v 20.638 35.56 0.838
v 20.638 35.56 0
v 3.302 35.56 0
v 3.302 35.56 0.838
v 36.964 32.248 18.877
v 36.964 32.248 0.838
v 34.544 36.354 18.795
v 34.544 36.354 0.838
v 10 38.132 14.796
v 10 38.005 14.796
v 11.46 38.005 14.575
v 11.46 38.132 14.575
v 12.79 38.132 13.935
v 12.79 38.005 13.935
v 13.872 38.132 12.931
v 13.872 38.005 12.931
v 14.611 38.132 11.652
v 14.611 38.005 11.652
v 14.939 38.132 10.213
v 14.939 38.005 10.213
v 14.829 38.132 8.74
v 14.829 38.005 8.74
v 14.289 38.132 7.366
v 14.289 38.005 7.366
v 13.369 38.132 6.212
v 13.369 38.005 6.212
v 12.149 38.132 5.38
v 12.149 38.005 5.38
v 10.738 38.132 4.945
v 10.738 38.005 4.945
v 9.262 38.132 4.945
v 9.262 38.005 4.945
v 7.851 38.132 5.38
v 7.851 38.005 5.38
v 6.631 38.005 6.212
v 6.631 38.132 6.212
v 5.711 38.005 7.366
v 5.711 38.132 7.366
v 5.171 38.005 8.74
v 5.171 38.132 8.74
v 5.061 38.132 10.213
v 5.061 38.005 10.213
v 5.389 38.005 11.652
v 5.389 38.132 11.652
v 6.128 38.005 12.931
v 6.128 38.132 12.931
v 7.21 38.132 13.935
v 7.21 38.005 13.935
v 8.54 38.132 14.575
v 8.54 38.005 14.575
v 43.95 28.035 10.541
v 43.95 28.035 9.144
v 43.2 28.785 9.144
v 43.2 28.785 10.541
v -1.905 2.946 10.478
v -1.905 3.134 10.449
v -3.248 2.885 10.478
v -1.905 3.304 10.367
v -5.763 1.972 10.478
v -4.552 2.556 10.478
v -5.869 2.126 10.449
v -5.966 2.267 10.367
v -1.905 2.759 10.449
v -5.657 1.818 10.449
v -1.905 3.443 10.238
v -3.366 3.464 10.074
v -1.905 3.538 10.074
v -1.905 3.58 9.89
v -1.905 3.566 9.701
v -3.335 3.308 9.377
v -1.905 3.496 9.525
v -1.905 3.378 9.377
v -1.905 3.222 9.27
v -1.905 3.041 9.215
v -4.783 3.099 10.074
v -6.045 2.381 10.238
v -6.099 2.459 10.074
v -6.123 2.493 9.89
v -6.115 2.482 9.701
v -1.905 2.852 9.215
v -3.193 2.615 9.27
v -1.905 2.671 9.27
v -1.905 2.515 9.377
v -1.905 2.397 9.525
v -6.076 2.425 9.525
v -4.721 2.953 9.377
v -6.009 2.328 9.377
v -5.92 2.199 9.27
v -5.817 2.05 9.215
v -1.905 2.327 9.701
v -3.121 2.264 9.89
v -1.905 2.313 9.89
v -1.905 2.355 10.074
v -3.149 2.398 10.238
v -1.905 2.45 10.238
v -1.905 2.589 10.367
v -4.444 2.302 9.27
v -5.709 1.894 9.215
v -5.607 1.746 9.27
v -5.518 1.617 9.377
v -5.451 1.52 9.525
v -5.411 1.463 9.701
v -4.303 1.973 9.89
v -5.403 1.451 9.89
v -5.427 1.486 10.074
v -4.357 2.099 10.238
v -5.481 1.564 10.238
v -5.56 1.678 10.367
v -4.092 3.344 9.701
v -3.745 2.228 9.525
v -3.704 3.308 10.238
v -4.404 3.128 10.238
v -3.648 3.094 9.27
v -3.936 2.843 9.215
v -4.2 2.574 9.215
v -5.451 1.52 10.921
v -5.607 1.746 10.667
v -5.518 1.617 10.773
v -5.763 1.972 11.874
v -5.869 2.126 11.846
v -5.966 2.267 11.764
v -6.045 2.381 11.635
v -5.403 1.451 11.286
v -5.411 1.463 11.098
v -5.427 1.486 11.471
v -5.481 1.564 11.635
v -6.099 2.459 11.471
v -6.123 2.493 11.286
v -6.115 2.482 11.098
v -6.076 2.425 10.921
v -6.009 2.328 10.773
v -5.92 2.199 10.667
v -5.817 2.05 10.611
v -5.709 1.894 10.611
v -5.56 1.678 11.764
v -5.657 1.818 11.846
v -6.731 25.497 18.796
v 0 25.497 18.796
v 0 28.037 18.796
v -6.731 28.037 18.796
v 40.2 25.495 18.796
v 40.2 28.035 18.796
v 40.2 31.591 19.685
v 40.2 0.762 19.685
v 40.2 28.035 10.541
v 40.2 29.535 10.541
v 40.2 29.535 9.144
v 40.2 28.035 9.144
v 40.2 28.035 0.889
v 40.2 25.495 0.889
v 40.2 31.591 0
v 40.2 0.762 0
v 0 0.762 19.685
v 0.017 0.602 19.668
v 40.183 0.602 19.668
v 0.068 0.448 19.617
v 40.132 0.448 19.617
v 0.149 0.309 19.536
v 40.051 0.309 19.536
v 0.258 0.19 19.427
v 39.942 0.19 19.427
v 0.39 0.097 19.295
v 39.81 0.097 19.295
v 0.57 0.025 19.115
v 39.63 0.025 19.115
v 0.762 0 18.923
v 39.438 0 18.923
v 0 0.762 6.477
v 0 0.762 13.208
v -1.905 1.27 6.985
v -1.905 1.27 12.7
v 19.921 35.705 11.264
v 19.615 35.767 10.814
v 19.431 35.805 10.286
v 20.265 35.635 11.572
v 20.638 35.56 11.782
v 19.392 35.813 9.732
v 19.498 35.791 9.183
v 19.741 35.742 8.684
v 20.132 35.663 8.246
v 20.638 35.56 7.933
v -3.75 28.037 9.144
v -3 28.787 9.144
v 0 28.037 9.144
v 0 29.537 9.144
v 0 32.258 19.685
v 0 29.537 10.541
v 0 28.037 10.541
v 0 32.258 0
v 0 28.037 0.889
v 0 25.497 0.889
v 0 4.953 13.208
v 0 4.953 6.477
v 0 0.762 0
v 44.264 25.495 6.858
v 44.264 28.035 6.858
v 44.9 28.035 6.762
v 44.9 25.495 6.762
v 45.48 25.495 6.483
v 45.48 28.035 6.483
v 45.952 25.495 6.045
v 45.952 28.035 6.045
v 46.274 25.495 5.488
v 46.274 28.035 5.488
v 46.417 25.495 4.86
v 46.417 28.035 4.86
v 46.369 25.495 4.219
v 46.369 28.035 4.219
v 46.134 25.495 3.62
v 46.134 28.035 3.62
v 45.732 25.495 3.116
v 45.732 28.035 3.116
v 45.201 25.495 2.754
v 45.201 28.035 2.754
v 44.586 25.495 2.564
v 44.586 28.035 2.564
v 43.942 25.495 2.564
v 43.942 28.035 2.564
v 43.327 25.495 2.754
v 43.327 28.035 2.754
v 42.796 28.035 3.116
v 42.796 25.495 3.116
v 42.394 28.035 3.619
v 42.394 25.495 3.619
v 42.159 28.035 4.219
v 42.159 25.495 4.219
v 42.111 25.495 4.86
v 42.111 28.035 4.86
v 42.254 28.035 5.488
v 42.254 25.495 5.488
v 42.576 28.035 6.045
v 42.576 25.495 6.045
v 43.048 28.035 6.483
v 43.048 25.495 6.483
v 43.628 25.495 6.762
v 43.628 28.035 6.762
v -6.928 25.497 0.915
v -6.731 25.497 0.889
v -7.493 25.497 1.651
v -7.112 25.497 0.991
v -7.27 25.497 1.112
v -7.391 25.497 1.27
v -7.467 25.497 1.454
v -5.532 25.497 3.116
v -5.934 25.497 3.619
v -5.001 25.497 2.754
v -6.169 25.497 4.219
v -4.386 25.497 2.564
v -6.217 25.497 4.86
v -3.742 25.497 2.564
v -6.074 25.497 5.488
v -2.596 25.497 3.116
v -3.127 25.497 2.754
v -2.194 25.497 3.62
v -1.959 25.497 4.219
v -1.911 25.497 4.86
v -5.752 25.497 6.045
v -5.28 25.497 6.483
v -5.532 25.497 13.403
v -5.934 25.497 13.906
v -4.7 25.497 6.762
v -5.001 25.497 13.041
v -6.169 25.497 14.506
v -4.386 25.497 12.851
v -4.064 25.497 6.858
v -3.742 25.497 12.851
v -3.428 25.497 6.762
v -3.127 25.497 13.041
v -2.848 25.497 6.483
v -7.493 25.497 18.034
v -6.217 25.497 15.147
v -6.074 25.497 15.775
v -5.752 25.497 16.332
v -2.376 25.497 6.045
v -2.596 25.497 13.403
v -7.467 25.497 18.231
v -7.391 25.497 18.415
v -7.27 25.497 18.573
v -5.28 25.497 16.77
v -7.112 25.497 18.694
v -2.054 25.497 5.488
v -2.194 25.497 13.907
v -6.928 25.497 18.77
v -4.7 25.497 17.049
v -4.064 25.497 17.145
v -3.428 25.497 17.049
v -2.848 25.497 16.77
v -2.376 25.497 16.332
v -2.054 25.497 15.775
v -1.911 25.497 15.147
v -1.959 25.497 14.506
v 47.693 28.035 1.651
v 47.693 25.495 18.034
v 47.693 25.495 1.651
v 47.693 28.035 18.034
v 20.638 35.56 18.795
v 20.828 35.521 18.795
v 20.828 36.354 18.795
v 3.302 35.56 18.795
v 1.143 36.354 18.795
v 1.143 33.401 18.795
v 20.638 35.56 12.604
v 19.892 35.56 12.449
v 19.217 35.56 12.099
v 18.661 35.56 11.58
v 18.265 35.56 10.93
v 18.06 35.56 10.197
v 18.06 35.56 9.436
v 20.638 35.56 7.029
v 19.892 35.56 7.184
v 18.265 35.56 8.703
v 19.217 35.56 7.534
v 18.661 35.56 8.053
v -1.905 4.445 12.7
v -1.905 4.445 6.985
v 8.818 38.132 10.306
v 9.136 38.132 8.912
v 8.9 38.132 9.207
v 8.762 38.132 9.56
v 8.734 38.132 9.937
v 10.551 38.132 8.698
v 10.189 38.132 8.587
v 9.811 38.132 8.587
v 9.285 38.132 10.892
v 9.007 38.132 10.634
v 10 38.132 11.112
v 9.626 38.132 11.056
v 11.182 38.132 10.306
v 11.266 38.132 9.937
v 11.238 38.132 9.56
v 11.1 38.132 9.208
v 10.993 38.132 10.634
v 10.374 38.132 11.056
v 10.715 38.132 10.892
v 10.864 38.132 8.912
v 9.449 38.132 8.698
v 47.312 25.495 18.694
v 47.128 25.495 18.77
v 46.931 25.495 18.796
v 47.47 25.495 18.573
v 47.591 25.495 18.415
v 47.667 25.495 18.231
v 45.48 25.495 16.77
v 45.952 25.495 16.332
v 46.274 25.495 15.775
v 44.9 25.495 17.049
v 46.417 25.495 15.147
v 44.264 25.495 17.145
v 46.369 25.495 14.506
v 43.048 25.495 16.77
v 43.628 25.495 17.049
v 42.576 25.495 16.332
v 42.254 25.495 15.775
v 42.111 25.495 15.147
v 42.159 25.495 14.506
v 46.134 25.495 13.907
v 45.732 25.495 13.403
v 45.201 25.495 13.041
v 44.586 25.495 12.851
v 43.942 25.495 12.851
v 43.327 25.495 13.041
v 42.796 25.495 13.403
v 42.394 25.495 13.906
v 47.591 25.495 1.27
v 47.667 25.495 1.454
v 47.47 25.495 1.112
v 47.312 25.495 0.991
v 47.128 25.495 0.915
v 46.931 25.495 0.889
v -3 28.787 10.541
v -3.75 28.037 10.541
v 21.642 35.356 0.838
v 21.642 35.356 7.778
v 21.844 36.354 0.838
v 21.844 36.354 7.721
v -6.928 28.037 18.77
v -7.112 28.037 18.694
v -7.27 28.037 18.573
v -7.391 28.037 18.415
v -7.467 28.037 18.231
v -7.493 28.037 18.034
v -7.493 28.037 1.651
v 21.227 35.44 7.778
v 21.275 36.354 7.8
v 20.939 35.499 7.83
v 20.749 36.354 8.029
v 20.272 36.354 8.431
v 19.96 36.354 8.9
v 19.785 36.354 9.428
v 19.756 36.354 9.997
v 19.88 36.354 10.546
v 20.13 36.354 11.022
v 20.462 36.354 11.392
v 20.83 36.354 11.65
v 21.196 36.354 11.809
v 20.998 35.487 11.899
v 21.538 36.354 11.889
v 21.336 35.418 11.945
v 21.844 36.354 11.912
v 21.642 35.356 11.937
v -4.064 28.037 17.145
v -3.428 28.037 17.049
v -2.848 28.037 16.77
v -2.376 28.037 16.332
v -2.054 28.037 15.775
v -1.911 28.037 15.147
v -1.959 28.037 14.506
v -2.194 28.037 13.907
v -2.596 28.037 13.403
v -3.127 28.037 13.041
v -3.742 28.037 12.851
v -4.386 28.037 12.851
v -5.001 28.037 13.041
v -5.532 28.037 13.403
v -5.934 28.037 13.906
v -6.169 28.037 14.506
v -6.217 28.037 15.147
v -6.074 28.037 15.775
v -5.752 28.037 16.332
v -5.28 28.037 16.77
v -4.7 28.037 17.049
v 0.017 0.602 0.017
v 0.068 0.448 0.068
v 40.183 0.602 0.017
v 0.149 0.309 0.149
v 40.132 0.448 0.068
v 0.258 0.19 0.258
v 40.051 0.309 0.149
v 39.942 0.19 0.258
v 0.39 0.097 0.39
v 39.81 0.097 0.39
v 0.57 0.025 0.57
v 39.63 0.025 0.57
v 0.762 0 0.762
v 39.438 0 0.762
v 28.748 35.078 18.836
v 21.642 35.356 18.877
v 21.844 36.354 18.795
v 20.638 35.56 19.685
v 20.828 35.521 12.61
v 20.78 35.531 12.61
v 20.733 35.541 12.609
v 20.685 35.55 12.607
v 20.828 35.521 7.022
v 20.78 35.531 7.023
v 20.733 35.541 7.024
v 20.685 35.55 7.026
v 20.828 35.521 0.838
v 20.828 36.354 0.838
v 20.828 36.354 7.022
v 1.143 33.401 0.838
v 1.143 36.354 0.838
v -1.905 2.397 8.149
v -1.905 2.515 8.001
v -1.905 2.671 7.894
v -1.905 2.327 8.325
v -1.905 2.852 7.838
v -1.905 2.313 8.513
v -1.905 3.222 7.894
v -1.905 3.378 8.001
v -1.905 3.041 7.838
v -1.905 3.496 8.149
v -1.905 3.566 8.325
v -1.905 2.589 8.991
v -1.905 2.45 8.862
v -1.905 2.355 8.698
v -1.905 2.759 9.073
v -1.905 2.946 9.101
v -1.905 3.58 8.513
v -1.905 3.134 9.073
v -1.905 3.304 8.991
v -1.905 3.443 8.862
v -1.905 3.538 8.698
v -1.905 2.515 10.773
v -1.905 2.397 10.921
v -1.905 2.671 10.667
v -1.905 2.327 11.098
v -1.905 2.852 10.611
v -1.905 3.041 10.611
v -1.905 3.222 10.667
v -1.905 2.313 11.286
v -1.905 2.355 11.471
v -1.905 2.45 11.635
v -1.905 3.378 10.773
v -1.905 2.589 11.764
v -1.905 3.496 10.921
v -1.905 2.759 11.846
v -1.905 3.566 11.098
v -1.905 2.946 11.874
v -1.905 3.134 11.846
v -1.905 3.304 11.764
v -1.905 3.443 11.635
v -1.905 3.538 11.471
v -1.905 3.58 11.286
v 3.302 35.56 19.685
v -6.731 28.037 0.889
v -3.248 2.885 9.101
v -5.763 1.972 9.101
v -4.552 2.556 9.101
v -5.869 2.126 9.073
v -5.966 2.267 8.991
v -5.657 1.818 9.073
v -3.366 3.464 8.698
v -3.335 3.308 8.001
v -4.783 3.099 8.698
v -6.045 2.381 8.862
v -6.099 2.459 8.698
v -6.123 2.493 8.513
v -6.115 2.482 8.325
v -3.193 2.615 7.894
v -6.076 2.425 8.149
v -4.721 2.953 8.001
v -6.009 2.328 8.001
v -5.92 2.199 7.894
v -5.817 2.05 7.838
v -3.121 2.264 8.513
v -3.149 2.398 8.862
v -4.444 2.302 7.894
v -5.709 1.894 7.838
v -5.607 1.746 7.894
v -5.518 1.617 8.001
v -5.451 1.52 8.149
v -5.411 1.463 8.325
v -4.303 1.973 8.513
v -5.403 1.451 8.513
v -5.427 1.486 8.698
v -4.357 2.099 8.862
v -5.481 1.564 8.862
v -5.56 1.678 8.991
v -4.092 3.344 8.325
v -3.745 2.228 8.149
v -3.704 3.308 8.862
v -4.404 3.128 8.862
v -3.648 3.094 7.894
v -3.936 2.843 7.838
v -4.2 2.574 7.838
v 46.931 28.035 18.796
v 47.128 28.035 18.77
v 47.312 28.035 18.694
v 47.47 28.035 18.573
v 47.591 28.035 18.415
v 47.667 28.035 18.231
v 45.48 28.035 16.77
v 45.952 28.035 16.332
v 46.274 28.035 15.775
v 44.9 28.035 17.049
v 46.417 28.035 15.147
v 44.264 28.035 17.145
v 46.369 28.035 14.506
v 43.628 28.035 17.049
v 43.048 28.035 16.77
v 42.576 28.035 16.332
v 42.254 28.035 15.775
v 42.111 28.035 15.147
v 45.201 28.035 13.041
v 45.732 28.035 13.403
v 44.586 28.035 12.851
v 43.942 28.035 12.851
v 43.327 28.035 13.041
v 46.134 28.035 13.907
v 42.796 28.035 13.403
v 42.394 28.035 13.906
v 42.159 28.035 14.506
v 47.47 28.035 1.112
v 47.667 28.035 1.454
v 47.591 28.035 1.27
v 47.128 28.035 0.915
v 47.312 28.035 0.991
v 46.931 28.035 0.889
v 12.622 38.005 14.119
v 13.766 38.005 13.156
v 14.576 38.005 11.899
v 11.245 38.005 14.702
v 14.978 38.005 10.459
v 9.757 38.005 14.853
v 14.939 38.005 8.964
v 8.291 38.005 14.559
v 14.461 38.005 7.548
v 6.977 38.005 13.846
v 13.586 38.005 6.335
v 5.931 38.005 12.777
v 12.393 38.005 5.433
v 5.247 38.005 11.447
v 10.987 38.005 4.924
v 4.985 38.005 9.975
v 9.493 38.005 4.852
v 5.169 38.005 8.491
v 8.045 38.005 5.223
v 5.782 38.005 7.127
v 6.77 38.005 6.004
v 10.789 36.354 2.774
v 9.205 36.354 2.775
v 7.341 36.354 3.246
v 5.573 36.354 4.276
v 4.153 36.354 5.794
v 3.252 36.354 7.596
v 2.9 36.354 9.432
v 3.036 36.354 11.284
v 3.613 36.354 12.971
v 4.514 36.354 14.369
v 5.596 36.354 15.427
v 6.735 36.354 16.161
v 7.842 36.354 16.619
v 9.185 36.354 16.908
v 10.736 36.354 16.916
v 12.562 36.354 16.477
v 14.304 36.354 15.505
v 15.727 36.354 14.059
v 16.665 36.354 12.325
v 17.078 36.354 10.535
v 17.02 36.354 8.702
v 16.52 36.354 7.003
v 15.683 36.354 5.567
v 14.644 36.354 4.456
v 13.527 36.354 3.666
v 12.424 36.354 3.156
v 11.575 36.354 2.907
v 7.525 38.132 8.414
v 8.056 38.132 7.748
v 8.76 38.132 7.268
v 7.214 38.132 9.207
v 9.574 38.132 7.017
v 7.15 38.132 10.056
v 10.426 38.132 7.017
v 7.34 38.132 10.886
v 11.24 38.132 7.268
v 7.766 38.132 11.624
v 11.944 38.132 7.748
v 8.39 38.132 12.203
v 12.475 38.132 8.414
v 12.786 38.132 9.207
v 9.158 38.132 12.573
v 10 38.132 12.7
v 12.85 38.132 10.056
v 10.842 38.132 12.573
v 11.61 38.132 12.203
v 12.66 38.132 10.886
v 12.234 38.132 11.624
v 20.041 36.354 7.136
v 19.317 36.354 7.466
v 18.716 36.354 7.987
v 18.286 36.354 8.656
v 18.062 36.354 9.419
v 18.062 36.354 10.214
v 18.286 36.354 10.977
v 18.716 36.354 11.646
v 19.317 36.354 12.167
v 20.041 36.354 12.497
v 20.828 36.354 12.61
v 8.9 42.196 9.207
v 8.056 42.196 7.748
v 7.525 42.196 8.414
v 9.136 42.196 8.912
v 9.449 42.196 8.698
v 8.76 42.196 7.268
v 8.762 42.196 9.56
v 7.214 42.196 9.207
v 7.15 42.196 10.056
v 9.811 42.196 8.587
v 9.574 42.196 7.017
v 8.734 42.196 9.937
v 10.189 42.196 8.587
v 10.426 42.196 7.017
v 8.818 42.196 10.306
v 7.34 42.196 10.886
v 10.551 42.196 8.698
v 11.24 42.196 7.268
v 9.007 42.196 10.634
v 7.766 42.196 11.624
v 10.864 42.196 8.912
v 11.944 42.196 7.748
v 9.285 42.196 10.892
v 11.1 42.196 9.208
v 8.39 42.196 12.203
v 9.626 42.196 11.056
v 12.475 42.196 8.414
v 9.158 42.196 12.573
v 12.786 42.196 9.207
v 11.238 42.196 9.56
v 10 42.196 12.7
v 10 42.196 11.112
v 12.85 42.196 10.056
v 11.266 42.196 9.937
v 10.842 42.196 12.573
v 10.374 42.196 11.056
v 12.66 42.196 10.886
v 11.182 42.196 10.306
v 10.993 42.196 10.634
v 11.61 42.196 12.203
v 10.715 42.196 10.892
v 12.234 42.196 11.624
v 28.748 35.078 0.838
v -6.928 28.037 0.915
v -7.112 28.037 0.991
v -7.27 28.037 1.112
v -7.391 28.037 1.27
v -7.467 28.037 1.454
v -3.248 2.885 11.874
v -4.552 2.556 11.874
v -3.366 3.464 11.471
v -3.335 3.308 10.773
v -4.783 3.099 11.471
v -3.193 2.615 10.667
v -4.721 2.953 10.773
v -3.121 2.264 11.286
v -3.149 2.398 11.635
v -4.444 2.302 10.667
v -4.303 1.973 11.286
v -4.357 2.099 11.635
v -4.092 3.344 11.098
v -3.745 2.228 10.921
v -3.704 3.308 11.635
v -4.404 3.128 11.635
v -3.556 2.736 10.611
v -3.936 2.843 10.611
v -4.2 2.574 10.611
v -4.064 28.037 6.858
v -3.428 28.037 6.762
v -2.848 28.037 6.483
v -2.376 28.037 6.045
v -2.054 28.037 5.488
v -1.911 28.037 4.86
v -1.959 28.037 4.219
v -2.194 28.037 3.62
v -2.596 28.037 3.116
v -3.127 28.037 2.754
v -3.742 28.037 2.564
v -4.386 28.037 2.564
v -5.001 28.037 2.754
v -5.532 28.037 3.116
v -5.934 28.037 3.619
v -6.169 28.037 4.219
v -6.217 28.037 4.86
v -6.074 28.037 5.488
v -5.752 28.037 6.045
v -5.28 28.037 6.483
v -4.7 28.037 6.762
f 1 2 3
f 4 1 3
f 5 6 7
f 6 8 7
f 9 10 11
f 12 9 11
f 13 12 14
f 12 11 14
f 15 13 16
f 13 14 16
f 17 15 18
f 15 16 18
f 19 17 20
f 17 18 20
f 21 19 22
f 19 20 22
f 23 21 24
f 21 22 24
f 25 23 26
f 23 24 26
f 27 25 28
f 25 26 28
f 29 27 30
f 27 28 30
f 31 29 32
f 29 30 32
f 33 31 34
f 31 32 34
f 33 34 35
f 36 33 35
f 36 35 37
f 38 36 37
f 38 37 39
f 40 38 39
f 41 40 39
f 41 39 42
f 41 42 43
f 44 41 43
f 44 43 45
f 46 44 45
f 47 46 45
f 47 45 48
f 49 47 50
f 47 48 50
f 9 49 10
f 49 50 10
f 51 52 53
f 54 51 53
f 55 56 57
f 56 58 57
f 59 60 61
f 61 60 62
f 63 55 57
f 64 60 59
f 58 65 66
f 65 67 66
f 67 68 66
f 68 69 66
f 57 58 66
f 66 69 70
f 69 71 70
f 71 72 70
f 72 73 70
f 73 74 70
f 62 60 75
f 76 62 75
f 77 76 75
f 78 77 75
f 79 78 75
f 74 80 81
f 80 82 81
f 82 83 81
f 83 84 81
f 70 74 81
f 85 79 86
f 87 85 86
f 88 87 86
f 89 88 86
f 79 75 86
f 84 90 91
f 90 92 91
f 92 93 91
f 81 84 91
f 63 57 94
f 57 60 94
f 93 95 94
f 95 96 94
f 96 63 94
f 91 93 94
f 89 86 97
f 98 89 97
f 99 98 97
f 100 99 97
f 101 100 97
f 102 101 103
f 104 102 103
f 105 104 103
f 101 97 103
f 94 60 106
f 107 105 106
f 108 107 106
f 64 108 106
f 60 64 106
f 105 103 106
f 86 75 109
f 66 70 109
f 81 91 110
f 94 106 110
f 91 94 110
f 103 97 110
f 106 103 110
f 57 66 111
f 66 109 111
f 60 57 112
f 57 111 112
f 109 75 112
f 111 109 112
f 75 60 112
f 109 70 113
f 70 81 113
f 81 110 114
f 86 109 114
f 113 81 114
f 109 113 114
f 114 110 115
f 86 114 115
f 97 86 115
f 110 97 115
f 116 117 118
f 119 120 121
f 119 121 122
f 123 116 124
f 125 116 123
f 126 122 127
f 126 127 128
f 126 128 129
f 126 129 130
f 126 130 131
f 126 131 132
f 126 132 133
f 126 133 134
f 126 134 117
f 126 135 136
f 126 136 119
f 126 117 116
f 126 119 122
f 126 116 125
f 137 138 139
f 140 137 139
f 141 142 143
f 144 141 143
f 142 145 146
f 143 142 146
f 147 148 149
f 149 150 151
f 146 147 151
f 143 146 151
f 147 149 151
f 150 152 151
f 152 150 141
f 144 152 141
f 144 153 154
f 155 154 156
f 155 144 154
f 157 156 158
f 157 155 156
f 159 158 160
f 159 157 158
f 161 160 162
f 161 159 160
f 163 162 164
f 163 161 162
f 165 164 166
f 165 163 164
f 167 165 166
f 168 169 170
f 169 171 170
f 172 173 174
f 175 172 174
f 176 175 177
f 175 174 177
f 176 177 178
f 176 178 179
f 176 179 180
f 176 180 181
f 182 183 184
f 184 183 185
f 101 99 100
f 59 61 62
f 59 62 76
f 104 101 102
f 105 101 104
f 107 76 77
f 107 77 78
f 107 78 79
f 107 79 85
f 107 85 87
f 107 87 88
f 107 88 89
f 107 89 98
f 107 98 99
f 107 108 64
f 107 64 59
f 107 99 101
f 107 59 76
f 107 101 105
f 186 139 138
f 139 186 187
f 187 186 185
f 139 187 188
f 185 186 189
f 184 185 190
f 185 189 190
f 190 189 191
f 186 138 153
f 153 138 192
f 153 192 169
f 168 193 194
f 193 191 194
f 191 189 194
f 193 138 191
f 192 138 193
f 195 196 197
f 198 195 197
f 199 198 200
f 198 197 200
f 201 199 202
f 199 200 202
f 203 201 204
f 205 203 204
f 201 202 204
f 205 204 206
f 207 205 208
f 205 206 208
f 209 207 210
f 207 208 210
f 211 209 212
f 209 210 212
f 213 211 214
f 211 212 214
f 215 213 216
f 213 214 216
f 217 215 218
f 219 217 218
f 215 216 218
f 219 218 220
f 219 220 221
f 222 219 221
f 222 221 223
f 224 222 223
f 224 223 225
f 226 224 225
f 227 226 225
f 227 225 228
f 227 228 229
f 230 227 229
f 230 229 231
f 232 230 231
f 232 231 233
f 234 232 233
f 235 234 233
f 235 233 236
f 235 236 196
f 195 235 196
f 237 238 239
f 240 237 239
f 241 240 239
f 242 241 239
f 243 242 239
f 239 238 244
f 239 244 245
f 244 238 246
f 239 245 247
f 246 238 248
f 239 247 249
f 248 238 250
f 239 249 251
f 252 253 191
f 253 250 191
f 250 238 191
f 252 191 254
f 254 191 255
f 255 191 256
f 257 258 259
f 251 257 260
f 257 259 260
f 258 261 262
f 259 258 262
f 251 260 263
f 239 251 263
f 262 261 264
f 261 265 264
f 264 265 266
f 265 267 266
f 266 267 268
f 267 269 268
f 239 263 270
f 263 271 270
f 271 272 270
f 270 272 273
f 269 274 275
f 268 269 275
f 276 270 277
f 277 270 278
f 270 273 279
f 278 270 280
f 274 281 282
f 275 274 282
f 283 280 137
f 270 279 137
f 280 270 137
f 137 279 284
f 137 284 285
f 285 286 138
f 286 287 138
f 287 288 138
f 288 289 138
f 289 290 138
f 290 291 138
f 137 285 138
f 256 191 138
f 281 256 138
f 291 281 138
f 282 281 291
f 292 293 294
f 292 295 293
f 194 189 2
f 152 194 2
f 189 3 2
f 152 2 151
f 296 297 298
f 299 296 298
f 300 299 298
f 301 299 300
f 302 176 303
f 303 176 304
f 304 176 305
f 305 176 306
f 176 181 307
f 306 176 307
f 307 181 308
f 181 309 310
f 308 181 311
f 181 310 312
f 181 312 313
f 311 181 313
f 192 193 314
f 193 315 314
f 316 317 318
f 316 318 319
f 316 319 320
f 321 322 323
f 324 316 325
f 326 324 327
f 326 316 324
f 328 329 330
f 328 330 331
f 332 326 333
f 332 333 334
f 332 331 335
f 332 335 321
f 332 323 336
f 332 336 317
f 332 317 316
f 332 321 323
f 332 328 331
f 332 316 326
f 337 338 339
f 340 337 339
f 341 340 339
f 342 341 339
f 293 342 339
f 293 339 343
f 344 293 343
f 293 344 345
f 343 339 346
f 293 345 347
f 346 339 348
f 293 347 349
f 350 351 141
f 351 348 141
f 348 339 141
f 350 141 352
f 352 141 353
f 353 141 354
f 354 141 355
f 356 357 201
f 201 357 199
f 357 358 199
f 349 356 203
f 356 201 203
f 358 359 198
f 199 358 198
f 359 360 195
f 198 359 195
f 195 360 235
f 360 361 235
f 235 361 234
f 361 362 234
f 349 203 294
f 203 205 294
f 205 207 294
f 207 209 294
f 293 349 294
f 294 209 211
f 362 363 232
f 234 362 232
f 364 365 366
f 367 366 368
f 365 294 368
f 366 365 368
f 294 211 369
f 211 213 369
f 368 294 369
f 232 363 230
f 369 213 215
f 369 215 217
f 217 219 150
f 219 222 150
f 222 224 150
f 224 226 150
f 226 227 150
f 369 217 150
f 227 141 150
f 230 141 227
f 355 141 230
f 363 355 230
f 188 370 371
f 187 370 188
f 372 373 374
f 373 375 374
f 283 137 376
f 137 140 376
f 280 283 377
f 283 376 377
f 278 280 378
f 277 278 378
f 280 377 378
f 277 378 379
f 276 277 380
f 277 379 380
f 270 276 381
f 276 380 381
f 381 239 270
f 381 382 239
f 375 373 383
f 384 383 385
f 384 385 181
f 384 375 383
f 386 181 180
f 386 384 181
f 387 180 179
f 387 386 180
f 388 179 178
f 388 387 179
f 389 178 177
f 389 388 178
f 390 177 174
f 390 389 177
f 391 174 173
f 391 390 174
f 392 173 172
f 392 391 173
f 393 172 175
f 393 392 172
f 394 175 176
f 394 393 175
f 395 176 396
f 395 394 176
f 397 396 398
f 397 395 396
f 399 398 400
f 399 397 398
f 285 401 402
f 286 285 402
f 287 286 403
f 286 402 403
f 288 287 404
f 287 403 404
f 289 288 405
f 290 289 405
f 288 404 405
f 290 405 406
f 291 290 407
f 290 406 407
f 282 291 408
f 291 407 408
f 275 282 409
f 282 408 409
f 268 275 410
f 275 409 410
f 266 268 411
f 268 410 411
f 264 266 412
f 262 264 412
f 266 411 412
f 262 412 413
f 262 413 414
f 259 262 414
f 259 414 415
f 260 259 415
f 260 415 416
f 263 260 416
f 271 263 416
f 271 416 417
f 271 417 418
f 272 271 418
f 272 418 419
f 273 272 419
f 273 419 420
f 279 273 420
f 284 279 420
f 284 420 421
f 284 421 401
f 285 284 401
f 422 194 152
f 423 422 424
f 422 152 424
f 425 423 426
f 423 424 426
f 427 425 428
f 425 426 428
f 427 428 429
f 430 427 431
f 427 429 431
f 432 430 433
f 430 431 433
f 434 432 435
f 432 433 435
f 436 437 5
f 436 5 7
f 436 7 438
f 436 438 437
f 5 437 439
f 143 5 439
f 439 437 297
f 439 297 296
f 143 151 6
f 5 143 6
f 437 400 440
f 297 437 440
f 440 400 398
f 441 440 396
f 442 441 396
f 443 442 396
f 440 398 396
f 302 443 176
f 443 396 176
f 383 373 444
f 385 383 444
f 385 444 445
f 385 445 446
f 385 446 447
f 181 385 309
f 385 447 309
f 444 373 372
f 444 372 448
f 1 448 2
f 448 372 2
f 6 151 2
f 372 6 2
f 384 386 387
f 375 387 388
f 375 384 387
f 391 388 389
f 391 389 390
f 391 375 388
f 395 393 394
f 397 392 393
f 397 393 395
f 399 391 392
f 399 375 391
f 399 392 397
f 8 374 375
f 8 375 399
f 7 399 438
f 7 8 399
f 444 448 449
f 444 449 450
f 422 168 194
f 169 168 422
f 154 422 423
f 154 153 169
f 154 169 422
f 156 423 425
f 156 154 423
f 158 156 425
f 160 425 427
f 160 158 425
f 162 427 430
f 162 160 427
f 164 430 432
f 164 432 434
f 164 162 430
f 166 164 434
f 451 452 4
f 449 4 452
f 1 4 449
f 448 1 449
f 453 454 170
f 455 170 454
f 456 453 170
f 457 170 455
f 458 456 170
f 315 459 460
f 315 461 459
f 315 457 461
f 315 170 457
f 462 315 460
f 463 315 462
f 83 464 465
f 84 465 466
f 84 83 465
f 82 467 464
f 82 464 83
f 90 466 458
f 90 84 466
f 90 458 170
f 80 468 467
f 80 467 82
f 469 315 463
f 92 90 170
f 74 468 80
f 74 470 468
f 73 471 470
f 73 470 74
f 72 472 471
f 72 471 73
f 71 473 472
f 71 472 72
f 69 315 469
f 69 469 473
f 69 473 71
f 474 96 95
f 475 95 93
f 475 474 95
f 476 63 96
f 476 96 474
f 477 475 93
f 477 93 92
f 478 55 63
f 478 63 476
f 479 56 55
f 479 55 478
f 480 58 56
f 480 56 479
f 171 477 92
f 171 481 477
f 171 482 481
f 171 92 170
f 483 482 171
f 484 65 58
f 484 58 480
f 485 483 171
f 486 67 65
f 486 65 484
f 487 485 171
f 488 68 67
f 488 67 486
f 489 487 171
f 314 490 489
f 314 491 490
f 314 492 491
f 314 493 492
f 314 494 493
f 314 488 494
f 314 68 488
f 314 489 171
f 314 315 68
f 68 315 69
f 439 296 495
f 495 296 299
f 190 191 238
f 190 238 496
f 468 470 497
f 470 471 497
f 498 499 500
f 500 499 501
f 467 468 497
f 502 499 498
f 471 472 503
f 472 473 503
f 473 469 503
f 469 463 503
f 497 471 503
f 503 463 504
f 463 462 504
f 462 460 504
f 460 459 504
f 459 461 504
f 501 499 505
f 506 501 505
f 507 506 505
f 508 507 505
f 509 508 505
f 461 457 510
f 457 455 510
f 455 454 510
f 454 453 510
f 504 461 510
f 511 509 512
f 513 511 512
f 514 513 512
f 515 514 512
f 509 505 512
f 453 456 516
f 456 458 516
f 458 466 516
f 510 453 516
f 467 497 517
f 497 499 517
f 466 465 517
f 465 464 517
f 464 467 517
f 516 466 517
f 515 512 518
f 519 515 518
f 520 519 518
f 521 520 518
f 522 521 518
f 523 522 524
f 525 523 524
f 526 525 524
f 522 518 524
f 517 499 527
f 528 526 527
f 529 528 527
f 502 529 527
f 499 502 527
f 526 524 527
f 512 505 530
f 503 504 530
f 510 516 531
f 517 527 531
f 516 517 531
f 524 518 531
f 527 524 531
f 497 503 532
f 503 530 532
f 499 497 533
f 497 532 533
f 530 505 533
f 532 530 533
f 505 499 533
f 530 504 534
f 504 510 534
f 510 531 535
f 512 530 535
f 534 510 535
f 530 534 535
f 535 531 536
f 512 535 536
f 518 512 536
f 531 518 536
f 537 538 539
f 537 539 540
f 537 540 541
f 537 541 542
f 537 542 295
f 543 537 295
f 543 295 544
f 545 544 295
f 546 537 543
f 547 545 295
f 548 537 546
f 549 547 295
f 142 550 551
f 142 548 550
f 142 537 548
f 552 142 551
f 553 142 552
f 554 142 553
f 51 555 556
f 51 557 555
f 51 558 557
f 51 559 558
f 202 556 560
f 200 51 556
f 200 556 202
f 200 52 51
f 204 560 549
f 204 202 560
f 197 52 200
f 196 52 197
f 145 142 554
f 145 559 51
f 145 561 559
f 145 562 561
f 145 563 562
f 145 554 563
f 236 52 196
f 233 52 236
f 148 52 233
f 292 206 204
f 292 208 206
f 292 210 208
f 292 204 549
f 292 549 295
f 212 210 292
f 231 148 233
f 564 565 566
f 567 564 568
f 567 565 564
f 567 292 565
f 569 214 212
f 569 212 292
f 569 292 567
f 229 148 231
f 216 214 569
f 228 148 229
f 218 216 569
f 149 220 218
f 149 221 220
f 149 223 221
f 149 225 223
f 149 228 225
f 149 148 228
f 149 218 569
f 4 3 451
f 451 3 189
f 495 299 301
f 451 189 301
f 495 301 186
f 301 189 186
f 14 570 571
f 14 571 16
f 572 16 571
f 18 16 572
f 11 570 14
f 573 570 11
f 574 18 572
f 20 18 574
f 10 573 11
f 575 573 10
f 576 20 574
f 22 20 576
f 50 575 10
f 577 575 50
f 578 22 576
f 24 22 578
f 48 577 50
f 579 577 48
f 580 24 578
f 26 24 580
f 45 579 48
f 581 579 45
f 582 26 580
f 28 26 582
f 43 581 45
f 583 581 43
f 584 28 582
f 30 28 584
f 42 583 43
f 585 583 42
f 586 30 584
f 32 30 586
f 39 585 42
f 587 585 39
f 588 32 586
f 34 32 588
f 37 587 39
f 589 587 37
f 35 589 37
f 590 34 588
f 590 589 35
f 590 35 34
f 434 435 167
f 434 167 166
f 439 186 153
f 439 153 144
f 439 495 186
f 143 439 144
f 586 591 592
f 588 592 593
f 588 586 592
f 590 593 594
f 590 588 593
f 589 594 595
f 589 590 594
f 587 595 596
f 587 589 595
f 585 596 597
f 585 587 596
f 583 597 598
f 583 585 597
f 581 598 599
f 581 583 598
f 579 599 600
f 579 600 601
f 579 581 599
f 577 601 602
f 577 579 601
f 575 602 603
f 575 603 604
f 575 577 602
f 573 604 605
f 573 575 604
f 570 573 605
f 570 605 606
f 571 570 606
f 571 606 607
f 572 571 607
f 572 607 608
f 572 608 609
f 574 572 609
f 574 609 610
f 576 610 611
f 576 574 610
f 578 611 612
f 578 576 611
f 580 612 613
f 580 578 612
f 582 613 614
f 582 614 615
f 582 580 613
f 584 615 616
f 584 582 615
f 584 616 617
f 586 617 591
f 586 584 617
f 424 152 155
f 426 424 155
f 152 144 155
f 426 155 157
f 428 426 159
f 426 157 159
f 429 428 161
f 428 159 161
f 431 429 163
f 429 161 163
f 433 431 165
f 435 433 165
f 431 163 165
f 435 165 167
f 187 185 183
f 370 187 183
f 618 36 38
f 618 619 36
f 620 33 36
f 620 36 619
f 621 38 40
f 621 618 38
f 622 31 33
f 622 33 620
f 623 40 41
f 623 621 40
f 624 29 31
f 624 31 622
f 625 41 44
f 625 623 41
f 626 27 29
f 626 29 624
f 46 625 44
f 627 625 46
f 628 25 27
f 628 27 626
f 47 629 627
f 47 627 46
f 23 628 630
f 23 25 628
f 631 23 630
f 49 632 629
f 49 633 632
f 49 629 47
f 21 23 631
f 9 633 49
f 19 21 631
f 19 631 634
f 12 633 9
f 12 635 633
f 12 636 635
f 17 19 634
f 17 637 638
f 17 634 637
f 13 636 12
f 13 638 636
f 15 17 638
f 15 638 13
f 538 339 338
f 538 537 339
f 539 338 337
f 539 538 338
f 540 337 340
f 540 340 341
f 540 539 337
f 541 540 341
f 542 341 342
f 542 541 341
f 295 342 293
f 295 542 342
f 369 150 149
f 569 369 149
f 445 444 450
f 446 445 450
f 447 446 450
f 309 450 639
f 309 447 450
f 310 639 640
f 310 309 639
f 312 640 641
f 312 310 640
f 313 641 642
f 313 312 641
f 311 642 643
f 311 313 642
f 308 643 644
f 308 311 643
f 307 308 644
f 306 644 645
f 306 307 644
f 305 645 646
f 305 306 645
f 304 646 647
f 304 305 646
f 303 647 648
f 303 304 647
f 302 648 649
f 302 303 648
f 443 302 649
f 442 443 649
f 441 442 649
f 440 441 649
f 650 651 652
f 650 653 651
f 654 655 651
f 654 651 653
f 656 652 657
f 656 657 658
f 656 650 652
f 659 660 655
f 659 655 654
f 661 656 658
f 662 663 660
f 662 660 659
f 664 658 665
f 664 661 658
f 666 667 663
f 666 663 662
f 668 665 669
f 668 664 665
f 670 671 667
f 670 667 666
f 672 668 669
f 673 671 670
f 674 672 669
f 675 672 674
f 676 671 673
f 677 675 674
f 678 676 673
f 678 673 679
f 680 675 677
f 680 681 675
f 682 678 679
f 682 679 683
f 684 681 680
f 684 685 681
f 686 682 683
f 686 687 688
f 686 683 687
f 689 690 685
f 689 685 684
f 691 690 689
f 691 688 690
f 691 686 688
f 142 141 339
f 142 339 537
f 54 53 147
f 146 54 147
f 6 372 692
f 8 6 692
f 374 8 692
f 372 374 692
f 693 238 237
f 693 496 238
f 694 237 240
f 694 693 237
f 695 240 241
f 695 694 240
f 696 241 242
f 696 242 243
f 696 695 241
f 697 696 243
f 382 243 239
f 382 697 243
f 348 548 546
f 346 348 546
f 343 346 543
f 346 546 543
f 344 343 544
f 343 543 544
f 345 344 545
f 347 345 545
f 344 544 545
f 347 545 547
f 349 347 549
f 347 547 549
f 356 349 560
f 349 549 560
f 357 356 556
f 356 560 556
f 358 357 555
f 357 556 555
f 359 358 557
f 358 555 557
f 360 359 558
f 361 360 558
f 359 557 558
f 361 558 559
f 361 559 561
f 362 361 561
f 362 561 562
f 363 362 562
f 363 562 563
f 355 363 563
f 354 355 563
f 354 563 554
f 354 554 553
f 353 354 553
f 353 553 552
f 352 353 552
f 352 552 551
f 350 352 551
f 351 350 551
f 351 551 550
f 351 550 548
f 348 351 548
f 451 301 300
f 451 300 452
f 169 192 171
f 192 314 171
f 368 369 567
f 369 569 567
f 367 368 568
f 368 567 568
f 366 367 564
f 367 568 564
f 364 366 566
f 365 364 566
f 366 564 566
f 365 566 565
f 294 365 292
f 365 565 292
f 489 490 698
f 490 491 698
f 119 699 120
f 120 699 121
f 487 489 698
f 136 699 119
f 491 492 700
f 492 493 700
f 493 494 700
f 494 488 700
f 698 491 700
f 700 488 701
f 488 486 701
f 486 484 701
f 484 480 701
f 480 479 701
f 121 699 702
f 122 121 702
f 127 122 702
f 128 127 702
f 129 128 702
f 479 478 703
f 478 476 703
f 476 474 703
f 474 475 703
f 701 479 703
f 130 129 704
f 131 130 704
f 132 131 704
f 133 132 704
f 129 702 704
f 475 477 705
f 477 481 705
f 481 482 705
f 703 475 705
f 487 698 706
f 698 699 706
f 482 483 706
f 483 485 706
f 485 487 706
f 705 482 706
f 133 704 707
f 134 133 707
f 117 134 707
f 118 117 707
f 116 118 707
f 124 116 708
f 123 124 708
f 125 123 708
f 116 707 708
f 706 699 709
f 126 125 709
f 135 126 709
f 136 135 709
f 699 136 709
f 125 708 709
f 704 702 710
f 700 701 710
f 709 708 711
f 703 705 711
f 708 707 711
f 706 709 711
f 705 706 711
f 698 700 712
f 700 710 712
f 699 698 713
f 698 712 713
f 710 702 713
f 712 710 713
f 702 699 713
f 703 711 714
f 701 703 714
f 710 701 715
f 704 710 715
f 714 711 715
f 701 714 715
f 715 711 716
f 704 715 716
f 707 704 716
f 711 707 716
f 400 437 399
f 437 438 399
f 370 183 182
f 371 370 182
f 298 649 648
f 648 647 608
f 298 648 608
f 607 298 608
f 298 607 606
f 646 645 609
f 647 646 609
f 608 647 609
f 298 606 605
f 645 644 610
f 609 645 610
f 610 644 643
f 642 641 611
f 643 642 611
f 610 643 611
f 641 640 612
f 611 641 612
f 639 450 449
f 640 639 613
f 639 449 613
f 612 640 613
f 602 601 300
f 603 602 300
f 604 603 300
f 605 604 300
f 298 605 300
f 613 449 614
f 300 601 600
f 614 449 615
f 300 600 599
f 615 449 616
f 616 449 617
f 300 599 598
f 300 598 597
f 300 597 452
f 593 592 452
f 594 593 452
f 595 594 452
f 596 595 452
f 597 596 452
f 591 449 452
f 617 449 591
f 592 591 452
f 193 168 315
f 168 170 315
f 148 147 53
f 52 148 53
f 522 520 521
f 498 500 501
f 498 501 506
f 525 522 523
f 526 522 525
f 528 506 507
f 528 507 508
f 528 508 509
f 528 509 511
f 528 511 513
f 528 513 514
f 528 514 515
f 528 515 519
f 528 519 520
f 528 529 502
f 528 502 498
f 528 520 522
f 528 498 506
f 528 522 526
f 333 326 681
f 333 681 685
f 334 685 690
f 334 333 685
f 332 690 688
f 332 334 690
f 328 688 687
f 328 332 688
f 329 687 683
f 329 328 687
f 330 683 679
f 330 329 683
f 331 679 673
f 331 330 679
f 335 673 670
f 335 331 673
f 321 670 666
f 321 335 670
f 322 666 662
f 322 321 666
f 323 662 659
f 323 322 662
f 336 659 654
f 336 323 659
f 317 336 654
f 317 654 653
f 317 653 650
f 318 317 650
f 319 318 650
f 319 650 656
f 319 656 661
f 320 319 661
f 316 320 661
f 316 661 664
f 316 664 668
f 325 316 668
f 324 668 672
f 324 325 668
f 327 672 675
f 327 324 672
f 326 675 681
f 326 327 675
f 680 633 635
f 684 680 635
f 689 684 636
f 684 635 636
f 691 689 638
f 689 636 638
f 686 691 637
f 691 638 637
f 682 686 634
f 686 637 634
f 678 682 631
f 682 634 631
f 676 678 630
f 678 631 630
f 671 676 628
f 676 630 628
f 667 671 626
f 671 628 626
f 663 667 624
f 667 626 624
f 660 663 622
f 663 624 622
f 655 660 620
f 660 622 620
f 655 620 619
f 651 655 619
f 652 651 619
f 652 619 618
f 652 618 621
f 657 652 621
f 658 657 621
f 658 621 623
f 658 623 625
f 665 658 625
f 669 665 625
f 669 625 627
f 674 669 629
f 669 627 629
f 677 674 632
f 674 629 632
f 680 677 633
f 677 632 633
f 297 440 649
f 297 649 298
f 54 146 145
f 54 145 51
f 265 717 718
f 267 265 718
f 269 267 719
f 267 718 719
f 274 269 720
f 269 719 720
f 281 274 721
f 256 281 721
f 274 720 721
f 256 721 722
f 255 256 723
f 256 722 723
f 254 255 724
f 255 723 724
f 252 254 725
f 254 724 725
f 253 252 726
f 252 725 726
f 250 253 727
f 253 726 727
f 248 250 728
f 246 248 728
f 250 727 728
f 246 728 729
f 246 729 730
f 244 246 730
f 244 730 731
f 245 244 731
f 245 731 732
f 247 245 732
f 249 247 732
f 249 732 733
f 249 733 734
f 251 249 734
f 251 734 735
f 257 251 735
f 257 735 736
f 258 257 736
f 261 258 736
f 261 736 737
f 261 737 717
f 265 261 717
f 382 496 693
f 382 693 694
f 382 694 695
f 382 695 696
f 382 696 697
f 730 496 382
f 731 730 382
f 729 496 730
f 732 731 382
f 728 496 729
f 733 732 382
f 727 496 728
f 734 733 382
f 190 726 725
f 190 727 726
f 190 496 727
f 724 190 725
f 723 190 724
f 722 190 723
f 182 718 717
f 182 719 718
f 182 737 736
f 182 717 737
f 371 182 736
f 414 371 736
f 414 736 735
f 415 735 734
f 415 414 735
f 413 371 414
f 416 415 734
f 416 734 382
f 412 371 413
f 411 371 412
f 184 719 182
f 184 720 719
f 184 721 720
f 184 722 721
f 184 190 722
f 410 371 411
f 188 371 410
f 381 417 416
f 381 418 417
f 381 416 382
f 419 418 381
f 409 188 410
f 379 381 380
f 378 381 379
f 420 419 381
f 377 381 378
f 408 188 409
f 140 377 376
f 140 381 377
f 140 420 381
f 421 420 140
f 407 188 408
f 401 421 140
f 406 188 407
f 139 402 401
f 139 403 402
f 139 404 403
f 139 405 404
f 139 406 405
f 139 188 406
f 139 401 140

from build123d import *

# Parameters (mm, degrees)
EXTRUDE1_DEPTH     = 19.685
CHAMFER1_SIZE      = 3.302
FILLET1_R          = 0.762
SKETCH2_W          = 17.907
SKETCH2_H          = 2.54
EXTRUDE2_DEPTH     = 7.493
SKETCH4_W          = 17.907
SKETCH4_H          = 2.54
EXTRUDE3_DEPTH     = 7.493
FILLET2_R          = 0.762
EXTRUDE4_DEPTH     = 36.35375
SKETCH10_R         = 2.159
CUT_EXTRUDE1_DEPTH = 36.35375
SKETCH19_R         = 2.159
CUT_EXTRUDE2_DEPTH = 59.72110295
RIB2_START         = -0.6985
RIB2_DEPTH         = 1.397
RIB3_START         = -0.6985
RIB3_DEPTH         = 1.397
SKETCH16_R         = 5.0165
EXTRUDE5_DEPTH     = 1.651
SKETCH18_R         = 4.953
EXTRUDE6_DEPTH     = 0.127
SKETCH20_R         = 2.8575
SKETCH20_R_2       = 1.27
EXTRUDE7_DEPTH     = 4.064
SKETCH22_W         = 5.715
SKETCH22_H         = 3.175
EXTRUDE8_DEPTH     = 1.905
SKETCH24_R         = 0.635


with BuildPart() as part:
    # Sketch1 → Extrude1 (new body)
    with BuildSketch(Plane.XY):
        Polygon((0, 0), (40.2, 0), (40.2, 31.59125), (20.6375, 35.56), (0, 35.56), align=None)
    extrude(amount=EXTRUDE1_DEPTH)

    # Chamfer1
    chamfer1_edges = [part.edges().sort_by_distance(p)[0] for p in [
        (0, 35.56, 9.8425),
    ]]
    chamfer(chamfer1_edges, length=CHAMFER1_SIZE)

    # Fillet1
    fillet1_edges = [part.edges().sort_by_distance(p)[0] for p in [
        (20.1, 0, 0),
        (20.1, 0, 19.685),
        (40.2, 0, 9.8425),
        (0, 0, 9.8425),
    ]]
    fillet(fillet1_edges, radius=FILLET1_R)

    # Sketch2 → Extrude2 (add)
    with BuildSketch(Plane(origin=(40.2, 0, 0), x_dir=(0, 0, -1), z_dir=(1, 0, 0))):
        with Locations((-9.8425, 26.76525)):
            Rectangle(SKETCH2_W, SKETCH2_H)
    extrude(amount=EXTRUDE2_DEPTH)

    # Sketch4 → Extrude3 (add)
    with BuildSketch(Plane.ZY):
        with Locations((9.8425, 26.76652)):
            Rectangle(SKETCH4_W, SKETCH4_H)
    extrude(amount=EXTRUDE3_DEPTH)

    # Fillet2
    fillet2_edges = [part.edges().sort_by_distance(p)[0] for p in [
        (47.693, 26.76525, 18.796),
        (47.693, 26.76525, 0.889),
        (-7.493, 26.76652, 0.889),
        (-7.493, 26.76652, 18.796),
    ]]
    fillet(fillet2_edges, radius=FILLET2_R)

    # Sketch5 → Extrude4 (add)
    with BuildSketch(Plane(origin=(0, 0, 0), x_dir=(1, 0, 0), z_dir=(0, 1, 0))):
        with BuildLine():
            Line((1.143, -0.837535442), (20.828, -0.837535442))
            Line((20.828, -0.837535442), (20.828, -7.022435442))
            ThreePointArc((20.828, -7.022435442), (18.034, -9.816435442), (20.828, -12.610435442))
            Line((20.828, -12.610435442), (20.828, -18.795335442))
            Line((20.828, -18.795335442), (1.143, -18.795335442))
            Line((1.143, -18.795335442), (1.143, -0.837535442))
        make_face()
    extrude(amount=EXTRUDE4_DEPTH)

    # Loft1: read off the stored shape, not the designer's step
    # Loft1: loft between two sections, ruled curve by curve
    loft1_from = [
        Edge.make_bspline([(21.641638875, 35.356284925, 7.777844123), (20.350474841, 35.618230344, 7.645115734), (19.387970871, 35.813498721, 8.533256016), (19.387970871, 35.813498721, 11.181528503), (20.350474841, 35.618230344, 12.069668784), (21.641638875, 35.356284925, 11.936940395)], [0, 0, 0, 0, 0.5, 0.5, 1, 1, 1, 1], 3, [1, 0.609161307, 0.475443008, 0.475443008, 0.609161307, 1]),
        Edge.make_bspline([(21.641638875, 35.356284925, 18.877249077), (36.963924395, 32.247770131, 18.877249077)], [0, 0, 1, 1], 1),
        Edge.make_line((21.641638875, 35.356284925, 0.837535442), (36.963924395, 32.247770131, 0.837535442)),
        Edge.make_line((36.963924395, 32.247770131, 0.837535442), (36.963924395, 32.247770131, 18.877249077)),
        Edge.make_line((21.641638875, 35.356284925, 7.777844123), (21.641638875, 35.356284925, 0.837535442)),
        Edge.make_line((21.641638875, 35.356284925, 18.877249077), (21.641638875, 35.356284925, 11.936940395)),
    ]
    loft1_to = [
        Edge.make_bspline([(21.844, 36.35375, 7.720935442), (20.79625, 36.35375, 7.720935442), (19.7485, 36.35375, 8.419435442), (19.7485, 36.35375, 11.213435442), (20.79625, 36.35375, 11.911935442), (21.844, 36.35375, 11.911935442)], [0, 0, 0, 0, 0.5, 0.5, 1, 1, 1, 1], 3, [1, 0.666666667, 0.5, 0.5, 0.666666667, 1]),
        Edge.make_bspline([(21.844, 36.35375, 18.795335442), (34.544, 36.35375, 18.795335442)], [0, 0, 1, 1], 1),
        Edge.make_line((21.844, 36.35375, 0.837535442), (34.544, 36.35375, 0.837535442)),
        Edge.make_line((34.544, 36.35375, 0.837535442), (34.544, 36.35375, 18.795335442)),
        Edge.make_line((21.844, 36.35375, 7.720935442), (21.844, 36.35375, 0.837535442)),
        Edge.make_line((21.844, 36.35375, 18.795335442), (21.844, 36.35375, 11.911935442)),
    ]
    loft1 = Solid(Shell([*[Face.make_surface_from_curves(loft1_from[k], loft1_to[k]) for k in range(6)], Face(Wire(loft1_from)), Face(Wire(loft1_to))]))
    add(loft1)

    # Sketch10 → Cut-Extrude1 (cut)
    with BuildSketch(Plane(origin=(0, 28.03525, 0), x_dir=(-1, 0, 0), z_dir=(0, 1, 0))):
        with Locations(Location((-44.264, 4.699, 0), (0, 0, 90))):
            Circle(SKETCH10_R)
        with Locations(Location((-44.264, 14.986, 0), (0, 0, 90))):
            Circle(SKETCH10_R)
    extrude(amount=-CUT_EXTRUDE1_DEPTH, mode=Mode.SUBTRACT)

    # Sketch19 → Cut-Extrude2 (cut, through all)
    with BuildSketch(Plane(origin=(0, 28.03652, 0), x_dir=(-1, 0, 0), z_dir=(0, 1, 0))):
        with Locations(Location((4.064, 4.699, 0), (0, 0, 90))):
            Circle(SKETCH19_R)
        with Locations(Location((4.064, 14.986, 0), (0, 0, 90))):
            Circle(SKETCH19_R)
    extrude(amount=-CUT_EXTRUDE2_DEPTH, mode=Mode.SUBTRACT)

    # Rib2: read off the stored shape, not the designer's step
    # Rib2 outline → Rib2 (add)
    with BuildSketch(Plane.XY.offset(9.8425).offset(RIB2_START)):
        Polygon((43.95, 28.03525), (43.2, 28.78525), (40.2, 29.53525), (40.2, 28.03525), align=None)
    extrude(amount=RIB2_DEPTH)

    # Rib3: read off the stored shape, not the designer's step
    # Rib3 outline → Rib3 (add)
    with BuildSketch(Plane.XY.offset(9.8425).offset(RIB3_START)):
        Polygon((0, 29.53652), (-3, 28.78652), (-3.75, 28.03652), (0, 28.03652), align=None)
    extrude(amount=RIB3_DEPTH)

    # Sketch16 → Extrude5 (add)
    with BuildSketch(Plane(origin=(0, 36.35375, 0), x_dir=(-1, 0, 0), z_dir=(0, 1, 0))):
        with Locations(Location((-10, 9.8425, 0), (0, 0, 270))):
            Circle(SKETCH16_R)
    extrude(amount=EXTRUDE5_DEPTH)

    # Loft2: read off the stored shape, not the designer's step
    # Loft2: loft between two sections, ruled curve by curve
    loft2_from = [
        Edge.make_bspline([(10.789313033, 36.35375, 2.774435984), (-3.346815, 36.35375, 1.195809919), (-4.925441065, 36.35375, 15.331937951), (9.210686967, 36.35375, 16.910564016), (23.346815, 36.35375, 18.489190081), (24.925441065, 36.35375, 4.353062049), (10.789313033, 36.35375, 2.774435984)], [0, 0, 0, 0, 0.5, 0.5, 0.5, 1, 1, 1, 1], 3, [1, 0.333333333, 0.333333333, 1, 0.333333333, 0.333333333, 1]),
    ]
    loft2_to = [
        Edge.make_bspline([(9.493399511, 38.00475, 4.851645545), (-0.488309399, 38.00475, 5.864846522), (0.524891578, 38.00475, 15.846555433), (10.506600489, 38.00475, 14.833354455), (20.488309399, 38.00475, 13.820153478), (19.475108422, 38.00475, 3.838444567), (9.493399511, 38.00475, 4.851645545)], [0, 0, 0, 0, 0.5, 0.5, 0.5, 1, 1, 1, 1], 3, [1, 0.333333333, 0.333333333, 1, 0.333333333, 0.333333333, 1]),
    ]
    loft2 = Solid(Shell([*[Face.make_surface_from_curves(loft2_from[k], loft2_to[k]) for k in range(1)], Face(Wire(loft2_from)), Face(Wire(loft2_to))]))
    add(loft2)

    # Sketch18 → Extrude6 (add)
    with BuildSketch(Plane(origin=(0, 38.00475, 0), x_dir=(-1, 0, 0), z_dir=(0, 1, 0))):
        with Locations(Location((-10, 9.8425, 0), (0, 0, 90))):
            Circle(SKETCH18_R)
    extrude(amount=EXTRUDE6_DEPTH)

    # Sketch20 → Extrude7 (add)
    with BuildSketch(Plane(origin=(0, 38.13175, 0), x_dir=(-1, 0, 0), z_dir=(0, 1, 0))):
        with Locations(Location((-10, 9.8425, 0), (0, 0, 90))):
            Circle(SKETCH20_R)
        with Locations(Location((-10, 9.8425, 0), (0, 0, 90))):
            Circle(SKETCH20_R_2, mode=Mode.SUBTRACT)
    extrude(amount=EXTRUDE7_DEPTH)

    # Sketch22 → Extrude8 (add)
    with BuildSketch(Plane.ZY):
        with Locations((9.8425, 2.8575)):
            Rectangle(SKETCH22_W, SKETCH22_H)
    extrude(amount=EXTRUDE8_DEPTH)

    # Sketch21 → section 0 of loft3
    with BuildSketch(Plane.ZY, mode=Mode.PRIVATE) as loft3_s0:
        with BuildLine():
            Line((6.477, 4.953), (13.208, 4.953))
            Line((13.208, 4.953), (13.208, 0.762))
            Line((13.208, 0.762), (6.477, 0.762))
            Line((6.477, 0.762), (6.477, 4.953))
        make_face()
    # loft up to a face of the part (loft3)
    loft([loft3_s0.sketch, part.faces().sort_by_distance((-1.905, 2.8575, 9.8425))[0]])

    # Sweep3: sweep along a path in Sketch23
    with BuildLine(Plane.XY.offset(9.8425)) as sweep3_path:
        ThreePointArc((-1.905, 2.946484605), (-3.908218654, 2.753050744), (-5.763136487, 1.972293764))
    # Sketch24 → Sweep3 (sweep)
    with BuildSketch(Plane.ZY.offset(1.905)):
        with Locations((9.8425, 2.946484605)):
            Circle(SKETCH24_R)
        with Locations((11.23883905, 2.946484605)):
            Circle(SKETCH24_R)
        with Locations((8.466018651, 2.946484605)):
            Circle(SKETCH24_R)
    sweep(path=sweep3_path.line)


solid = part.part
